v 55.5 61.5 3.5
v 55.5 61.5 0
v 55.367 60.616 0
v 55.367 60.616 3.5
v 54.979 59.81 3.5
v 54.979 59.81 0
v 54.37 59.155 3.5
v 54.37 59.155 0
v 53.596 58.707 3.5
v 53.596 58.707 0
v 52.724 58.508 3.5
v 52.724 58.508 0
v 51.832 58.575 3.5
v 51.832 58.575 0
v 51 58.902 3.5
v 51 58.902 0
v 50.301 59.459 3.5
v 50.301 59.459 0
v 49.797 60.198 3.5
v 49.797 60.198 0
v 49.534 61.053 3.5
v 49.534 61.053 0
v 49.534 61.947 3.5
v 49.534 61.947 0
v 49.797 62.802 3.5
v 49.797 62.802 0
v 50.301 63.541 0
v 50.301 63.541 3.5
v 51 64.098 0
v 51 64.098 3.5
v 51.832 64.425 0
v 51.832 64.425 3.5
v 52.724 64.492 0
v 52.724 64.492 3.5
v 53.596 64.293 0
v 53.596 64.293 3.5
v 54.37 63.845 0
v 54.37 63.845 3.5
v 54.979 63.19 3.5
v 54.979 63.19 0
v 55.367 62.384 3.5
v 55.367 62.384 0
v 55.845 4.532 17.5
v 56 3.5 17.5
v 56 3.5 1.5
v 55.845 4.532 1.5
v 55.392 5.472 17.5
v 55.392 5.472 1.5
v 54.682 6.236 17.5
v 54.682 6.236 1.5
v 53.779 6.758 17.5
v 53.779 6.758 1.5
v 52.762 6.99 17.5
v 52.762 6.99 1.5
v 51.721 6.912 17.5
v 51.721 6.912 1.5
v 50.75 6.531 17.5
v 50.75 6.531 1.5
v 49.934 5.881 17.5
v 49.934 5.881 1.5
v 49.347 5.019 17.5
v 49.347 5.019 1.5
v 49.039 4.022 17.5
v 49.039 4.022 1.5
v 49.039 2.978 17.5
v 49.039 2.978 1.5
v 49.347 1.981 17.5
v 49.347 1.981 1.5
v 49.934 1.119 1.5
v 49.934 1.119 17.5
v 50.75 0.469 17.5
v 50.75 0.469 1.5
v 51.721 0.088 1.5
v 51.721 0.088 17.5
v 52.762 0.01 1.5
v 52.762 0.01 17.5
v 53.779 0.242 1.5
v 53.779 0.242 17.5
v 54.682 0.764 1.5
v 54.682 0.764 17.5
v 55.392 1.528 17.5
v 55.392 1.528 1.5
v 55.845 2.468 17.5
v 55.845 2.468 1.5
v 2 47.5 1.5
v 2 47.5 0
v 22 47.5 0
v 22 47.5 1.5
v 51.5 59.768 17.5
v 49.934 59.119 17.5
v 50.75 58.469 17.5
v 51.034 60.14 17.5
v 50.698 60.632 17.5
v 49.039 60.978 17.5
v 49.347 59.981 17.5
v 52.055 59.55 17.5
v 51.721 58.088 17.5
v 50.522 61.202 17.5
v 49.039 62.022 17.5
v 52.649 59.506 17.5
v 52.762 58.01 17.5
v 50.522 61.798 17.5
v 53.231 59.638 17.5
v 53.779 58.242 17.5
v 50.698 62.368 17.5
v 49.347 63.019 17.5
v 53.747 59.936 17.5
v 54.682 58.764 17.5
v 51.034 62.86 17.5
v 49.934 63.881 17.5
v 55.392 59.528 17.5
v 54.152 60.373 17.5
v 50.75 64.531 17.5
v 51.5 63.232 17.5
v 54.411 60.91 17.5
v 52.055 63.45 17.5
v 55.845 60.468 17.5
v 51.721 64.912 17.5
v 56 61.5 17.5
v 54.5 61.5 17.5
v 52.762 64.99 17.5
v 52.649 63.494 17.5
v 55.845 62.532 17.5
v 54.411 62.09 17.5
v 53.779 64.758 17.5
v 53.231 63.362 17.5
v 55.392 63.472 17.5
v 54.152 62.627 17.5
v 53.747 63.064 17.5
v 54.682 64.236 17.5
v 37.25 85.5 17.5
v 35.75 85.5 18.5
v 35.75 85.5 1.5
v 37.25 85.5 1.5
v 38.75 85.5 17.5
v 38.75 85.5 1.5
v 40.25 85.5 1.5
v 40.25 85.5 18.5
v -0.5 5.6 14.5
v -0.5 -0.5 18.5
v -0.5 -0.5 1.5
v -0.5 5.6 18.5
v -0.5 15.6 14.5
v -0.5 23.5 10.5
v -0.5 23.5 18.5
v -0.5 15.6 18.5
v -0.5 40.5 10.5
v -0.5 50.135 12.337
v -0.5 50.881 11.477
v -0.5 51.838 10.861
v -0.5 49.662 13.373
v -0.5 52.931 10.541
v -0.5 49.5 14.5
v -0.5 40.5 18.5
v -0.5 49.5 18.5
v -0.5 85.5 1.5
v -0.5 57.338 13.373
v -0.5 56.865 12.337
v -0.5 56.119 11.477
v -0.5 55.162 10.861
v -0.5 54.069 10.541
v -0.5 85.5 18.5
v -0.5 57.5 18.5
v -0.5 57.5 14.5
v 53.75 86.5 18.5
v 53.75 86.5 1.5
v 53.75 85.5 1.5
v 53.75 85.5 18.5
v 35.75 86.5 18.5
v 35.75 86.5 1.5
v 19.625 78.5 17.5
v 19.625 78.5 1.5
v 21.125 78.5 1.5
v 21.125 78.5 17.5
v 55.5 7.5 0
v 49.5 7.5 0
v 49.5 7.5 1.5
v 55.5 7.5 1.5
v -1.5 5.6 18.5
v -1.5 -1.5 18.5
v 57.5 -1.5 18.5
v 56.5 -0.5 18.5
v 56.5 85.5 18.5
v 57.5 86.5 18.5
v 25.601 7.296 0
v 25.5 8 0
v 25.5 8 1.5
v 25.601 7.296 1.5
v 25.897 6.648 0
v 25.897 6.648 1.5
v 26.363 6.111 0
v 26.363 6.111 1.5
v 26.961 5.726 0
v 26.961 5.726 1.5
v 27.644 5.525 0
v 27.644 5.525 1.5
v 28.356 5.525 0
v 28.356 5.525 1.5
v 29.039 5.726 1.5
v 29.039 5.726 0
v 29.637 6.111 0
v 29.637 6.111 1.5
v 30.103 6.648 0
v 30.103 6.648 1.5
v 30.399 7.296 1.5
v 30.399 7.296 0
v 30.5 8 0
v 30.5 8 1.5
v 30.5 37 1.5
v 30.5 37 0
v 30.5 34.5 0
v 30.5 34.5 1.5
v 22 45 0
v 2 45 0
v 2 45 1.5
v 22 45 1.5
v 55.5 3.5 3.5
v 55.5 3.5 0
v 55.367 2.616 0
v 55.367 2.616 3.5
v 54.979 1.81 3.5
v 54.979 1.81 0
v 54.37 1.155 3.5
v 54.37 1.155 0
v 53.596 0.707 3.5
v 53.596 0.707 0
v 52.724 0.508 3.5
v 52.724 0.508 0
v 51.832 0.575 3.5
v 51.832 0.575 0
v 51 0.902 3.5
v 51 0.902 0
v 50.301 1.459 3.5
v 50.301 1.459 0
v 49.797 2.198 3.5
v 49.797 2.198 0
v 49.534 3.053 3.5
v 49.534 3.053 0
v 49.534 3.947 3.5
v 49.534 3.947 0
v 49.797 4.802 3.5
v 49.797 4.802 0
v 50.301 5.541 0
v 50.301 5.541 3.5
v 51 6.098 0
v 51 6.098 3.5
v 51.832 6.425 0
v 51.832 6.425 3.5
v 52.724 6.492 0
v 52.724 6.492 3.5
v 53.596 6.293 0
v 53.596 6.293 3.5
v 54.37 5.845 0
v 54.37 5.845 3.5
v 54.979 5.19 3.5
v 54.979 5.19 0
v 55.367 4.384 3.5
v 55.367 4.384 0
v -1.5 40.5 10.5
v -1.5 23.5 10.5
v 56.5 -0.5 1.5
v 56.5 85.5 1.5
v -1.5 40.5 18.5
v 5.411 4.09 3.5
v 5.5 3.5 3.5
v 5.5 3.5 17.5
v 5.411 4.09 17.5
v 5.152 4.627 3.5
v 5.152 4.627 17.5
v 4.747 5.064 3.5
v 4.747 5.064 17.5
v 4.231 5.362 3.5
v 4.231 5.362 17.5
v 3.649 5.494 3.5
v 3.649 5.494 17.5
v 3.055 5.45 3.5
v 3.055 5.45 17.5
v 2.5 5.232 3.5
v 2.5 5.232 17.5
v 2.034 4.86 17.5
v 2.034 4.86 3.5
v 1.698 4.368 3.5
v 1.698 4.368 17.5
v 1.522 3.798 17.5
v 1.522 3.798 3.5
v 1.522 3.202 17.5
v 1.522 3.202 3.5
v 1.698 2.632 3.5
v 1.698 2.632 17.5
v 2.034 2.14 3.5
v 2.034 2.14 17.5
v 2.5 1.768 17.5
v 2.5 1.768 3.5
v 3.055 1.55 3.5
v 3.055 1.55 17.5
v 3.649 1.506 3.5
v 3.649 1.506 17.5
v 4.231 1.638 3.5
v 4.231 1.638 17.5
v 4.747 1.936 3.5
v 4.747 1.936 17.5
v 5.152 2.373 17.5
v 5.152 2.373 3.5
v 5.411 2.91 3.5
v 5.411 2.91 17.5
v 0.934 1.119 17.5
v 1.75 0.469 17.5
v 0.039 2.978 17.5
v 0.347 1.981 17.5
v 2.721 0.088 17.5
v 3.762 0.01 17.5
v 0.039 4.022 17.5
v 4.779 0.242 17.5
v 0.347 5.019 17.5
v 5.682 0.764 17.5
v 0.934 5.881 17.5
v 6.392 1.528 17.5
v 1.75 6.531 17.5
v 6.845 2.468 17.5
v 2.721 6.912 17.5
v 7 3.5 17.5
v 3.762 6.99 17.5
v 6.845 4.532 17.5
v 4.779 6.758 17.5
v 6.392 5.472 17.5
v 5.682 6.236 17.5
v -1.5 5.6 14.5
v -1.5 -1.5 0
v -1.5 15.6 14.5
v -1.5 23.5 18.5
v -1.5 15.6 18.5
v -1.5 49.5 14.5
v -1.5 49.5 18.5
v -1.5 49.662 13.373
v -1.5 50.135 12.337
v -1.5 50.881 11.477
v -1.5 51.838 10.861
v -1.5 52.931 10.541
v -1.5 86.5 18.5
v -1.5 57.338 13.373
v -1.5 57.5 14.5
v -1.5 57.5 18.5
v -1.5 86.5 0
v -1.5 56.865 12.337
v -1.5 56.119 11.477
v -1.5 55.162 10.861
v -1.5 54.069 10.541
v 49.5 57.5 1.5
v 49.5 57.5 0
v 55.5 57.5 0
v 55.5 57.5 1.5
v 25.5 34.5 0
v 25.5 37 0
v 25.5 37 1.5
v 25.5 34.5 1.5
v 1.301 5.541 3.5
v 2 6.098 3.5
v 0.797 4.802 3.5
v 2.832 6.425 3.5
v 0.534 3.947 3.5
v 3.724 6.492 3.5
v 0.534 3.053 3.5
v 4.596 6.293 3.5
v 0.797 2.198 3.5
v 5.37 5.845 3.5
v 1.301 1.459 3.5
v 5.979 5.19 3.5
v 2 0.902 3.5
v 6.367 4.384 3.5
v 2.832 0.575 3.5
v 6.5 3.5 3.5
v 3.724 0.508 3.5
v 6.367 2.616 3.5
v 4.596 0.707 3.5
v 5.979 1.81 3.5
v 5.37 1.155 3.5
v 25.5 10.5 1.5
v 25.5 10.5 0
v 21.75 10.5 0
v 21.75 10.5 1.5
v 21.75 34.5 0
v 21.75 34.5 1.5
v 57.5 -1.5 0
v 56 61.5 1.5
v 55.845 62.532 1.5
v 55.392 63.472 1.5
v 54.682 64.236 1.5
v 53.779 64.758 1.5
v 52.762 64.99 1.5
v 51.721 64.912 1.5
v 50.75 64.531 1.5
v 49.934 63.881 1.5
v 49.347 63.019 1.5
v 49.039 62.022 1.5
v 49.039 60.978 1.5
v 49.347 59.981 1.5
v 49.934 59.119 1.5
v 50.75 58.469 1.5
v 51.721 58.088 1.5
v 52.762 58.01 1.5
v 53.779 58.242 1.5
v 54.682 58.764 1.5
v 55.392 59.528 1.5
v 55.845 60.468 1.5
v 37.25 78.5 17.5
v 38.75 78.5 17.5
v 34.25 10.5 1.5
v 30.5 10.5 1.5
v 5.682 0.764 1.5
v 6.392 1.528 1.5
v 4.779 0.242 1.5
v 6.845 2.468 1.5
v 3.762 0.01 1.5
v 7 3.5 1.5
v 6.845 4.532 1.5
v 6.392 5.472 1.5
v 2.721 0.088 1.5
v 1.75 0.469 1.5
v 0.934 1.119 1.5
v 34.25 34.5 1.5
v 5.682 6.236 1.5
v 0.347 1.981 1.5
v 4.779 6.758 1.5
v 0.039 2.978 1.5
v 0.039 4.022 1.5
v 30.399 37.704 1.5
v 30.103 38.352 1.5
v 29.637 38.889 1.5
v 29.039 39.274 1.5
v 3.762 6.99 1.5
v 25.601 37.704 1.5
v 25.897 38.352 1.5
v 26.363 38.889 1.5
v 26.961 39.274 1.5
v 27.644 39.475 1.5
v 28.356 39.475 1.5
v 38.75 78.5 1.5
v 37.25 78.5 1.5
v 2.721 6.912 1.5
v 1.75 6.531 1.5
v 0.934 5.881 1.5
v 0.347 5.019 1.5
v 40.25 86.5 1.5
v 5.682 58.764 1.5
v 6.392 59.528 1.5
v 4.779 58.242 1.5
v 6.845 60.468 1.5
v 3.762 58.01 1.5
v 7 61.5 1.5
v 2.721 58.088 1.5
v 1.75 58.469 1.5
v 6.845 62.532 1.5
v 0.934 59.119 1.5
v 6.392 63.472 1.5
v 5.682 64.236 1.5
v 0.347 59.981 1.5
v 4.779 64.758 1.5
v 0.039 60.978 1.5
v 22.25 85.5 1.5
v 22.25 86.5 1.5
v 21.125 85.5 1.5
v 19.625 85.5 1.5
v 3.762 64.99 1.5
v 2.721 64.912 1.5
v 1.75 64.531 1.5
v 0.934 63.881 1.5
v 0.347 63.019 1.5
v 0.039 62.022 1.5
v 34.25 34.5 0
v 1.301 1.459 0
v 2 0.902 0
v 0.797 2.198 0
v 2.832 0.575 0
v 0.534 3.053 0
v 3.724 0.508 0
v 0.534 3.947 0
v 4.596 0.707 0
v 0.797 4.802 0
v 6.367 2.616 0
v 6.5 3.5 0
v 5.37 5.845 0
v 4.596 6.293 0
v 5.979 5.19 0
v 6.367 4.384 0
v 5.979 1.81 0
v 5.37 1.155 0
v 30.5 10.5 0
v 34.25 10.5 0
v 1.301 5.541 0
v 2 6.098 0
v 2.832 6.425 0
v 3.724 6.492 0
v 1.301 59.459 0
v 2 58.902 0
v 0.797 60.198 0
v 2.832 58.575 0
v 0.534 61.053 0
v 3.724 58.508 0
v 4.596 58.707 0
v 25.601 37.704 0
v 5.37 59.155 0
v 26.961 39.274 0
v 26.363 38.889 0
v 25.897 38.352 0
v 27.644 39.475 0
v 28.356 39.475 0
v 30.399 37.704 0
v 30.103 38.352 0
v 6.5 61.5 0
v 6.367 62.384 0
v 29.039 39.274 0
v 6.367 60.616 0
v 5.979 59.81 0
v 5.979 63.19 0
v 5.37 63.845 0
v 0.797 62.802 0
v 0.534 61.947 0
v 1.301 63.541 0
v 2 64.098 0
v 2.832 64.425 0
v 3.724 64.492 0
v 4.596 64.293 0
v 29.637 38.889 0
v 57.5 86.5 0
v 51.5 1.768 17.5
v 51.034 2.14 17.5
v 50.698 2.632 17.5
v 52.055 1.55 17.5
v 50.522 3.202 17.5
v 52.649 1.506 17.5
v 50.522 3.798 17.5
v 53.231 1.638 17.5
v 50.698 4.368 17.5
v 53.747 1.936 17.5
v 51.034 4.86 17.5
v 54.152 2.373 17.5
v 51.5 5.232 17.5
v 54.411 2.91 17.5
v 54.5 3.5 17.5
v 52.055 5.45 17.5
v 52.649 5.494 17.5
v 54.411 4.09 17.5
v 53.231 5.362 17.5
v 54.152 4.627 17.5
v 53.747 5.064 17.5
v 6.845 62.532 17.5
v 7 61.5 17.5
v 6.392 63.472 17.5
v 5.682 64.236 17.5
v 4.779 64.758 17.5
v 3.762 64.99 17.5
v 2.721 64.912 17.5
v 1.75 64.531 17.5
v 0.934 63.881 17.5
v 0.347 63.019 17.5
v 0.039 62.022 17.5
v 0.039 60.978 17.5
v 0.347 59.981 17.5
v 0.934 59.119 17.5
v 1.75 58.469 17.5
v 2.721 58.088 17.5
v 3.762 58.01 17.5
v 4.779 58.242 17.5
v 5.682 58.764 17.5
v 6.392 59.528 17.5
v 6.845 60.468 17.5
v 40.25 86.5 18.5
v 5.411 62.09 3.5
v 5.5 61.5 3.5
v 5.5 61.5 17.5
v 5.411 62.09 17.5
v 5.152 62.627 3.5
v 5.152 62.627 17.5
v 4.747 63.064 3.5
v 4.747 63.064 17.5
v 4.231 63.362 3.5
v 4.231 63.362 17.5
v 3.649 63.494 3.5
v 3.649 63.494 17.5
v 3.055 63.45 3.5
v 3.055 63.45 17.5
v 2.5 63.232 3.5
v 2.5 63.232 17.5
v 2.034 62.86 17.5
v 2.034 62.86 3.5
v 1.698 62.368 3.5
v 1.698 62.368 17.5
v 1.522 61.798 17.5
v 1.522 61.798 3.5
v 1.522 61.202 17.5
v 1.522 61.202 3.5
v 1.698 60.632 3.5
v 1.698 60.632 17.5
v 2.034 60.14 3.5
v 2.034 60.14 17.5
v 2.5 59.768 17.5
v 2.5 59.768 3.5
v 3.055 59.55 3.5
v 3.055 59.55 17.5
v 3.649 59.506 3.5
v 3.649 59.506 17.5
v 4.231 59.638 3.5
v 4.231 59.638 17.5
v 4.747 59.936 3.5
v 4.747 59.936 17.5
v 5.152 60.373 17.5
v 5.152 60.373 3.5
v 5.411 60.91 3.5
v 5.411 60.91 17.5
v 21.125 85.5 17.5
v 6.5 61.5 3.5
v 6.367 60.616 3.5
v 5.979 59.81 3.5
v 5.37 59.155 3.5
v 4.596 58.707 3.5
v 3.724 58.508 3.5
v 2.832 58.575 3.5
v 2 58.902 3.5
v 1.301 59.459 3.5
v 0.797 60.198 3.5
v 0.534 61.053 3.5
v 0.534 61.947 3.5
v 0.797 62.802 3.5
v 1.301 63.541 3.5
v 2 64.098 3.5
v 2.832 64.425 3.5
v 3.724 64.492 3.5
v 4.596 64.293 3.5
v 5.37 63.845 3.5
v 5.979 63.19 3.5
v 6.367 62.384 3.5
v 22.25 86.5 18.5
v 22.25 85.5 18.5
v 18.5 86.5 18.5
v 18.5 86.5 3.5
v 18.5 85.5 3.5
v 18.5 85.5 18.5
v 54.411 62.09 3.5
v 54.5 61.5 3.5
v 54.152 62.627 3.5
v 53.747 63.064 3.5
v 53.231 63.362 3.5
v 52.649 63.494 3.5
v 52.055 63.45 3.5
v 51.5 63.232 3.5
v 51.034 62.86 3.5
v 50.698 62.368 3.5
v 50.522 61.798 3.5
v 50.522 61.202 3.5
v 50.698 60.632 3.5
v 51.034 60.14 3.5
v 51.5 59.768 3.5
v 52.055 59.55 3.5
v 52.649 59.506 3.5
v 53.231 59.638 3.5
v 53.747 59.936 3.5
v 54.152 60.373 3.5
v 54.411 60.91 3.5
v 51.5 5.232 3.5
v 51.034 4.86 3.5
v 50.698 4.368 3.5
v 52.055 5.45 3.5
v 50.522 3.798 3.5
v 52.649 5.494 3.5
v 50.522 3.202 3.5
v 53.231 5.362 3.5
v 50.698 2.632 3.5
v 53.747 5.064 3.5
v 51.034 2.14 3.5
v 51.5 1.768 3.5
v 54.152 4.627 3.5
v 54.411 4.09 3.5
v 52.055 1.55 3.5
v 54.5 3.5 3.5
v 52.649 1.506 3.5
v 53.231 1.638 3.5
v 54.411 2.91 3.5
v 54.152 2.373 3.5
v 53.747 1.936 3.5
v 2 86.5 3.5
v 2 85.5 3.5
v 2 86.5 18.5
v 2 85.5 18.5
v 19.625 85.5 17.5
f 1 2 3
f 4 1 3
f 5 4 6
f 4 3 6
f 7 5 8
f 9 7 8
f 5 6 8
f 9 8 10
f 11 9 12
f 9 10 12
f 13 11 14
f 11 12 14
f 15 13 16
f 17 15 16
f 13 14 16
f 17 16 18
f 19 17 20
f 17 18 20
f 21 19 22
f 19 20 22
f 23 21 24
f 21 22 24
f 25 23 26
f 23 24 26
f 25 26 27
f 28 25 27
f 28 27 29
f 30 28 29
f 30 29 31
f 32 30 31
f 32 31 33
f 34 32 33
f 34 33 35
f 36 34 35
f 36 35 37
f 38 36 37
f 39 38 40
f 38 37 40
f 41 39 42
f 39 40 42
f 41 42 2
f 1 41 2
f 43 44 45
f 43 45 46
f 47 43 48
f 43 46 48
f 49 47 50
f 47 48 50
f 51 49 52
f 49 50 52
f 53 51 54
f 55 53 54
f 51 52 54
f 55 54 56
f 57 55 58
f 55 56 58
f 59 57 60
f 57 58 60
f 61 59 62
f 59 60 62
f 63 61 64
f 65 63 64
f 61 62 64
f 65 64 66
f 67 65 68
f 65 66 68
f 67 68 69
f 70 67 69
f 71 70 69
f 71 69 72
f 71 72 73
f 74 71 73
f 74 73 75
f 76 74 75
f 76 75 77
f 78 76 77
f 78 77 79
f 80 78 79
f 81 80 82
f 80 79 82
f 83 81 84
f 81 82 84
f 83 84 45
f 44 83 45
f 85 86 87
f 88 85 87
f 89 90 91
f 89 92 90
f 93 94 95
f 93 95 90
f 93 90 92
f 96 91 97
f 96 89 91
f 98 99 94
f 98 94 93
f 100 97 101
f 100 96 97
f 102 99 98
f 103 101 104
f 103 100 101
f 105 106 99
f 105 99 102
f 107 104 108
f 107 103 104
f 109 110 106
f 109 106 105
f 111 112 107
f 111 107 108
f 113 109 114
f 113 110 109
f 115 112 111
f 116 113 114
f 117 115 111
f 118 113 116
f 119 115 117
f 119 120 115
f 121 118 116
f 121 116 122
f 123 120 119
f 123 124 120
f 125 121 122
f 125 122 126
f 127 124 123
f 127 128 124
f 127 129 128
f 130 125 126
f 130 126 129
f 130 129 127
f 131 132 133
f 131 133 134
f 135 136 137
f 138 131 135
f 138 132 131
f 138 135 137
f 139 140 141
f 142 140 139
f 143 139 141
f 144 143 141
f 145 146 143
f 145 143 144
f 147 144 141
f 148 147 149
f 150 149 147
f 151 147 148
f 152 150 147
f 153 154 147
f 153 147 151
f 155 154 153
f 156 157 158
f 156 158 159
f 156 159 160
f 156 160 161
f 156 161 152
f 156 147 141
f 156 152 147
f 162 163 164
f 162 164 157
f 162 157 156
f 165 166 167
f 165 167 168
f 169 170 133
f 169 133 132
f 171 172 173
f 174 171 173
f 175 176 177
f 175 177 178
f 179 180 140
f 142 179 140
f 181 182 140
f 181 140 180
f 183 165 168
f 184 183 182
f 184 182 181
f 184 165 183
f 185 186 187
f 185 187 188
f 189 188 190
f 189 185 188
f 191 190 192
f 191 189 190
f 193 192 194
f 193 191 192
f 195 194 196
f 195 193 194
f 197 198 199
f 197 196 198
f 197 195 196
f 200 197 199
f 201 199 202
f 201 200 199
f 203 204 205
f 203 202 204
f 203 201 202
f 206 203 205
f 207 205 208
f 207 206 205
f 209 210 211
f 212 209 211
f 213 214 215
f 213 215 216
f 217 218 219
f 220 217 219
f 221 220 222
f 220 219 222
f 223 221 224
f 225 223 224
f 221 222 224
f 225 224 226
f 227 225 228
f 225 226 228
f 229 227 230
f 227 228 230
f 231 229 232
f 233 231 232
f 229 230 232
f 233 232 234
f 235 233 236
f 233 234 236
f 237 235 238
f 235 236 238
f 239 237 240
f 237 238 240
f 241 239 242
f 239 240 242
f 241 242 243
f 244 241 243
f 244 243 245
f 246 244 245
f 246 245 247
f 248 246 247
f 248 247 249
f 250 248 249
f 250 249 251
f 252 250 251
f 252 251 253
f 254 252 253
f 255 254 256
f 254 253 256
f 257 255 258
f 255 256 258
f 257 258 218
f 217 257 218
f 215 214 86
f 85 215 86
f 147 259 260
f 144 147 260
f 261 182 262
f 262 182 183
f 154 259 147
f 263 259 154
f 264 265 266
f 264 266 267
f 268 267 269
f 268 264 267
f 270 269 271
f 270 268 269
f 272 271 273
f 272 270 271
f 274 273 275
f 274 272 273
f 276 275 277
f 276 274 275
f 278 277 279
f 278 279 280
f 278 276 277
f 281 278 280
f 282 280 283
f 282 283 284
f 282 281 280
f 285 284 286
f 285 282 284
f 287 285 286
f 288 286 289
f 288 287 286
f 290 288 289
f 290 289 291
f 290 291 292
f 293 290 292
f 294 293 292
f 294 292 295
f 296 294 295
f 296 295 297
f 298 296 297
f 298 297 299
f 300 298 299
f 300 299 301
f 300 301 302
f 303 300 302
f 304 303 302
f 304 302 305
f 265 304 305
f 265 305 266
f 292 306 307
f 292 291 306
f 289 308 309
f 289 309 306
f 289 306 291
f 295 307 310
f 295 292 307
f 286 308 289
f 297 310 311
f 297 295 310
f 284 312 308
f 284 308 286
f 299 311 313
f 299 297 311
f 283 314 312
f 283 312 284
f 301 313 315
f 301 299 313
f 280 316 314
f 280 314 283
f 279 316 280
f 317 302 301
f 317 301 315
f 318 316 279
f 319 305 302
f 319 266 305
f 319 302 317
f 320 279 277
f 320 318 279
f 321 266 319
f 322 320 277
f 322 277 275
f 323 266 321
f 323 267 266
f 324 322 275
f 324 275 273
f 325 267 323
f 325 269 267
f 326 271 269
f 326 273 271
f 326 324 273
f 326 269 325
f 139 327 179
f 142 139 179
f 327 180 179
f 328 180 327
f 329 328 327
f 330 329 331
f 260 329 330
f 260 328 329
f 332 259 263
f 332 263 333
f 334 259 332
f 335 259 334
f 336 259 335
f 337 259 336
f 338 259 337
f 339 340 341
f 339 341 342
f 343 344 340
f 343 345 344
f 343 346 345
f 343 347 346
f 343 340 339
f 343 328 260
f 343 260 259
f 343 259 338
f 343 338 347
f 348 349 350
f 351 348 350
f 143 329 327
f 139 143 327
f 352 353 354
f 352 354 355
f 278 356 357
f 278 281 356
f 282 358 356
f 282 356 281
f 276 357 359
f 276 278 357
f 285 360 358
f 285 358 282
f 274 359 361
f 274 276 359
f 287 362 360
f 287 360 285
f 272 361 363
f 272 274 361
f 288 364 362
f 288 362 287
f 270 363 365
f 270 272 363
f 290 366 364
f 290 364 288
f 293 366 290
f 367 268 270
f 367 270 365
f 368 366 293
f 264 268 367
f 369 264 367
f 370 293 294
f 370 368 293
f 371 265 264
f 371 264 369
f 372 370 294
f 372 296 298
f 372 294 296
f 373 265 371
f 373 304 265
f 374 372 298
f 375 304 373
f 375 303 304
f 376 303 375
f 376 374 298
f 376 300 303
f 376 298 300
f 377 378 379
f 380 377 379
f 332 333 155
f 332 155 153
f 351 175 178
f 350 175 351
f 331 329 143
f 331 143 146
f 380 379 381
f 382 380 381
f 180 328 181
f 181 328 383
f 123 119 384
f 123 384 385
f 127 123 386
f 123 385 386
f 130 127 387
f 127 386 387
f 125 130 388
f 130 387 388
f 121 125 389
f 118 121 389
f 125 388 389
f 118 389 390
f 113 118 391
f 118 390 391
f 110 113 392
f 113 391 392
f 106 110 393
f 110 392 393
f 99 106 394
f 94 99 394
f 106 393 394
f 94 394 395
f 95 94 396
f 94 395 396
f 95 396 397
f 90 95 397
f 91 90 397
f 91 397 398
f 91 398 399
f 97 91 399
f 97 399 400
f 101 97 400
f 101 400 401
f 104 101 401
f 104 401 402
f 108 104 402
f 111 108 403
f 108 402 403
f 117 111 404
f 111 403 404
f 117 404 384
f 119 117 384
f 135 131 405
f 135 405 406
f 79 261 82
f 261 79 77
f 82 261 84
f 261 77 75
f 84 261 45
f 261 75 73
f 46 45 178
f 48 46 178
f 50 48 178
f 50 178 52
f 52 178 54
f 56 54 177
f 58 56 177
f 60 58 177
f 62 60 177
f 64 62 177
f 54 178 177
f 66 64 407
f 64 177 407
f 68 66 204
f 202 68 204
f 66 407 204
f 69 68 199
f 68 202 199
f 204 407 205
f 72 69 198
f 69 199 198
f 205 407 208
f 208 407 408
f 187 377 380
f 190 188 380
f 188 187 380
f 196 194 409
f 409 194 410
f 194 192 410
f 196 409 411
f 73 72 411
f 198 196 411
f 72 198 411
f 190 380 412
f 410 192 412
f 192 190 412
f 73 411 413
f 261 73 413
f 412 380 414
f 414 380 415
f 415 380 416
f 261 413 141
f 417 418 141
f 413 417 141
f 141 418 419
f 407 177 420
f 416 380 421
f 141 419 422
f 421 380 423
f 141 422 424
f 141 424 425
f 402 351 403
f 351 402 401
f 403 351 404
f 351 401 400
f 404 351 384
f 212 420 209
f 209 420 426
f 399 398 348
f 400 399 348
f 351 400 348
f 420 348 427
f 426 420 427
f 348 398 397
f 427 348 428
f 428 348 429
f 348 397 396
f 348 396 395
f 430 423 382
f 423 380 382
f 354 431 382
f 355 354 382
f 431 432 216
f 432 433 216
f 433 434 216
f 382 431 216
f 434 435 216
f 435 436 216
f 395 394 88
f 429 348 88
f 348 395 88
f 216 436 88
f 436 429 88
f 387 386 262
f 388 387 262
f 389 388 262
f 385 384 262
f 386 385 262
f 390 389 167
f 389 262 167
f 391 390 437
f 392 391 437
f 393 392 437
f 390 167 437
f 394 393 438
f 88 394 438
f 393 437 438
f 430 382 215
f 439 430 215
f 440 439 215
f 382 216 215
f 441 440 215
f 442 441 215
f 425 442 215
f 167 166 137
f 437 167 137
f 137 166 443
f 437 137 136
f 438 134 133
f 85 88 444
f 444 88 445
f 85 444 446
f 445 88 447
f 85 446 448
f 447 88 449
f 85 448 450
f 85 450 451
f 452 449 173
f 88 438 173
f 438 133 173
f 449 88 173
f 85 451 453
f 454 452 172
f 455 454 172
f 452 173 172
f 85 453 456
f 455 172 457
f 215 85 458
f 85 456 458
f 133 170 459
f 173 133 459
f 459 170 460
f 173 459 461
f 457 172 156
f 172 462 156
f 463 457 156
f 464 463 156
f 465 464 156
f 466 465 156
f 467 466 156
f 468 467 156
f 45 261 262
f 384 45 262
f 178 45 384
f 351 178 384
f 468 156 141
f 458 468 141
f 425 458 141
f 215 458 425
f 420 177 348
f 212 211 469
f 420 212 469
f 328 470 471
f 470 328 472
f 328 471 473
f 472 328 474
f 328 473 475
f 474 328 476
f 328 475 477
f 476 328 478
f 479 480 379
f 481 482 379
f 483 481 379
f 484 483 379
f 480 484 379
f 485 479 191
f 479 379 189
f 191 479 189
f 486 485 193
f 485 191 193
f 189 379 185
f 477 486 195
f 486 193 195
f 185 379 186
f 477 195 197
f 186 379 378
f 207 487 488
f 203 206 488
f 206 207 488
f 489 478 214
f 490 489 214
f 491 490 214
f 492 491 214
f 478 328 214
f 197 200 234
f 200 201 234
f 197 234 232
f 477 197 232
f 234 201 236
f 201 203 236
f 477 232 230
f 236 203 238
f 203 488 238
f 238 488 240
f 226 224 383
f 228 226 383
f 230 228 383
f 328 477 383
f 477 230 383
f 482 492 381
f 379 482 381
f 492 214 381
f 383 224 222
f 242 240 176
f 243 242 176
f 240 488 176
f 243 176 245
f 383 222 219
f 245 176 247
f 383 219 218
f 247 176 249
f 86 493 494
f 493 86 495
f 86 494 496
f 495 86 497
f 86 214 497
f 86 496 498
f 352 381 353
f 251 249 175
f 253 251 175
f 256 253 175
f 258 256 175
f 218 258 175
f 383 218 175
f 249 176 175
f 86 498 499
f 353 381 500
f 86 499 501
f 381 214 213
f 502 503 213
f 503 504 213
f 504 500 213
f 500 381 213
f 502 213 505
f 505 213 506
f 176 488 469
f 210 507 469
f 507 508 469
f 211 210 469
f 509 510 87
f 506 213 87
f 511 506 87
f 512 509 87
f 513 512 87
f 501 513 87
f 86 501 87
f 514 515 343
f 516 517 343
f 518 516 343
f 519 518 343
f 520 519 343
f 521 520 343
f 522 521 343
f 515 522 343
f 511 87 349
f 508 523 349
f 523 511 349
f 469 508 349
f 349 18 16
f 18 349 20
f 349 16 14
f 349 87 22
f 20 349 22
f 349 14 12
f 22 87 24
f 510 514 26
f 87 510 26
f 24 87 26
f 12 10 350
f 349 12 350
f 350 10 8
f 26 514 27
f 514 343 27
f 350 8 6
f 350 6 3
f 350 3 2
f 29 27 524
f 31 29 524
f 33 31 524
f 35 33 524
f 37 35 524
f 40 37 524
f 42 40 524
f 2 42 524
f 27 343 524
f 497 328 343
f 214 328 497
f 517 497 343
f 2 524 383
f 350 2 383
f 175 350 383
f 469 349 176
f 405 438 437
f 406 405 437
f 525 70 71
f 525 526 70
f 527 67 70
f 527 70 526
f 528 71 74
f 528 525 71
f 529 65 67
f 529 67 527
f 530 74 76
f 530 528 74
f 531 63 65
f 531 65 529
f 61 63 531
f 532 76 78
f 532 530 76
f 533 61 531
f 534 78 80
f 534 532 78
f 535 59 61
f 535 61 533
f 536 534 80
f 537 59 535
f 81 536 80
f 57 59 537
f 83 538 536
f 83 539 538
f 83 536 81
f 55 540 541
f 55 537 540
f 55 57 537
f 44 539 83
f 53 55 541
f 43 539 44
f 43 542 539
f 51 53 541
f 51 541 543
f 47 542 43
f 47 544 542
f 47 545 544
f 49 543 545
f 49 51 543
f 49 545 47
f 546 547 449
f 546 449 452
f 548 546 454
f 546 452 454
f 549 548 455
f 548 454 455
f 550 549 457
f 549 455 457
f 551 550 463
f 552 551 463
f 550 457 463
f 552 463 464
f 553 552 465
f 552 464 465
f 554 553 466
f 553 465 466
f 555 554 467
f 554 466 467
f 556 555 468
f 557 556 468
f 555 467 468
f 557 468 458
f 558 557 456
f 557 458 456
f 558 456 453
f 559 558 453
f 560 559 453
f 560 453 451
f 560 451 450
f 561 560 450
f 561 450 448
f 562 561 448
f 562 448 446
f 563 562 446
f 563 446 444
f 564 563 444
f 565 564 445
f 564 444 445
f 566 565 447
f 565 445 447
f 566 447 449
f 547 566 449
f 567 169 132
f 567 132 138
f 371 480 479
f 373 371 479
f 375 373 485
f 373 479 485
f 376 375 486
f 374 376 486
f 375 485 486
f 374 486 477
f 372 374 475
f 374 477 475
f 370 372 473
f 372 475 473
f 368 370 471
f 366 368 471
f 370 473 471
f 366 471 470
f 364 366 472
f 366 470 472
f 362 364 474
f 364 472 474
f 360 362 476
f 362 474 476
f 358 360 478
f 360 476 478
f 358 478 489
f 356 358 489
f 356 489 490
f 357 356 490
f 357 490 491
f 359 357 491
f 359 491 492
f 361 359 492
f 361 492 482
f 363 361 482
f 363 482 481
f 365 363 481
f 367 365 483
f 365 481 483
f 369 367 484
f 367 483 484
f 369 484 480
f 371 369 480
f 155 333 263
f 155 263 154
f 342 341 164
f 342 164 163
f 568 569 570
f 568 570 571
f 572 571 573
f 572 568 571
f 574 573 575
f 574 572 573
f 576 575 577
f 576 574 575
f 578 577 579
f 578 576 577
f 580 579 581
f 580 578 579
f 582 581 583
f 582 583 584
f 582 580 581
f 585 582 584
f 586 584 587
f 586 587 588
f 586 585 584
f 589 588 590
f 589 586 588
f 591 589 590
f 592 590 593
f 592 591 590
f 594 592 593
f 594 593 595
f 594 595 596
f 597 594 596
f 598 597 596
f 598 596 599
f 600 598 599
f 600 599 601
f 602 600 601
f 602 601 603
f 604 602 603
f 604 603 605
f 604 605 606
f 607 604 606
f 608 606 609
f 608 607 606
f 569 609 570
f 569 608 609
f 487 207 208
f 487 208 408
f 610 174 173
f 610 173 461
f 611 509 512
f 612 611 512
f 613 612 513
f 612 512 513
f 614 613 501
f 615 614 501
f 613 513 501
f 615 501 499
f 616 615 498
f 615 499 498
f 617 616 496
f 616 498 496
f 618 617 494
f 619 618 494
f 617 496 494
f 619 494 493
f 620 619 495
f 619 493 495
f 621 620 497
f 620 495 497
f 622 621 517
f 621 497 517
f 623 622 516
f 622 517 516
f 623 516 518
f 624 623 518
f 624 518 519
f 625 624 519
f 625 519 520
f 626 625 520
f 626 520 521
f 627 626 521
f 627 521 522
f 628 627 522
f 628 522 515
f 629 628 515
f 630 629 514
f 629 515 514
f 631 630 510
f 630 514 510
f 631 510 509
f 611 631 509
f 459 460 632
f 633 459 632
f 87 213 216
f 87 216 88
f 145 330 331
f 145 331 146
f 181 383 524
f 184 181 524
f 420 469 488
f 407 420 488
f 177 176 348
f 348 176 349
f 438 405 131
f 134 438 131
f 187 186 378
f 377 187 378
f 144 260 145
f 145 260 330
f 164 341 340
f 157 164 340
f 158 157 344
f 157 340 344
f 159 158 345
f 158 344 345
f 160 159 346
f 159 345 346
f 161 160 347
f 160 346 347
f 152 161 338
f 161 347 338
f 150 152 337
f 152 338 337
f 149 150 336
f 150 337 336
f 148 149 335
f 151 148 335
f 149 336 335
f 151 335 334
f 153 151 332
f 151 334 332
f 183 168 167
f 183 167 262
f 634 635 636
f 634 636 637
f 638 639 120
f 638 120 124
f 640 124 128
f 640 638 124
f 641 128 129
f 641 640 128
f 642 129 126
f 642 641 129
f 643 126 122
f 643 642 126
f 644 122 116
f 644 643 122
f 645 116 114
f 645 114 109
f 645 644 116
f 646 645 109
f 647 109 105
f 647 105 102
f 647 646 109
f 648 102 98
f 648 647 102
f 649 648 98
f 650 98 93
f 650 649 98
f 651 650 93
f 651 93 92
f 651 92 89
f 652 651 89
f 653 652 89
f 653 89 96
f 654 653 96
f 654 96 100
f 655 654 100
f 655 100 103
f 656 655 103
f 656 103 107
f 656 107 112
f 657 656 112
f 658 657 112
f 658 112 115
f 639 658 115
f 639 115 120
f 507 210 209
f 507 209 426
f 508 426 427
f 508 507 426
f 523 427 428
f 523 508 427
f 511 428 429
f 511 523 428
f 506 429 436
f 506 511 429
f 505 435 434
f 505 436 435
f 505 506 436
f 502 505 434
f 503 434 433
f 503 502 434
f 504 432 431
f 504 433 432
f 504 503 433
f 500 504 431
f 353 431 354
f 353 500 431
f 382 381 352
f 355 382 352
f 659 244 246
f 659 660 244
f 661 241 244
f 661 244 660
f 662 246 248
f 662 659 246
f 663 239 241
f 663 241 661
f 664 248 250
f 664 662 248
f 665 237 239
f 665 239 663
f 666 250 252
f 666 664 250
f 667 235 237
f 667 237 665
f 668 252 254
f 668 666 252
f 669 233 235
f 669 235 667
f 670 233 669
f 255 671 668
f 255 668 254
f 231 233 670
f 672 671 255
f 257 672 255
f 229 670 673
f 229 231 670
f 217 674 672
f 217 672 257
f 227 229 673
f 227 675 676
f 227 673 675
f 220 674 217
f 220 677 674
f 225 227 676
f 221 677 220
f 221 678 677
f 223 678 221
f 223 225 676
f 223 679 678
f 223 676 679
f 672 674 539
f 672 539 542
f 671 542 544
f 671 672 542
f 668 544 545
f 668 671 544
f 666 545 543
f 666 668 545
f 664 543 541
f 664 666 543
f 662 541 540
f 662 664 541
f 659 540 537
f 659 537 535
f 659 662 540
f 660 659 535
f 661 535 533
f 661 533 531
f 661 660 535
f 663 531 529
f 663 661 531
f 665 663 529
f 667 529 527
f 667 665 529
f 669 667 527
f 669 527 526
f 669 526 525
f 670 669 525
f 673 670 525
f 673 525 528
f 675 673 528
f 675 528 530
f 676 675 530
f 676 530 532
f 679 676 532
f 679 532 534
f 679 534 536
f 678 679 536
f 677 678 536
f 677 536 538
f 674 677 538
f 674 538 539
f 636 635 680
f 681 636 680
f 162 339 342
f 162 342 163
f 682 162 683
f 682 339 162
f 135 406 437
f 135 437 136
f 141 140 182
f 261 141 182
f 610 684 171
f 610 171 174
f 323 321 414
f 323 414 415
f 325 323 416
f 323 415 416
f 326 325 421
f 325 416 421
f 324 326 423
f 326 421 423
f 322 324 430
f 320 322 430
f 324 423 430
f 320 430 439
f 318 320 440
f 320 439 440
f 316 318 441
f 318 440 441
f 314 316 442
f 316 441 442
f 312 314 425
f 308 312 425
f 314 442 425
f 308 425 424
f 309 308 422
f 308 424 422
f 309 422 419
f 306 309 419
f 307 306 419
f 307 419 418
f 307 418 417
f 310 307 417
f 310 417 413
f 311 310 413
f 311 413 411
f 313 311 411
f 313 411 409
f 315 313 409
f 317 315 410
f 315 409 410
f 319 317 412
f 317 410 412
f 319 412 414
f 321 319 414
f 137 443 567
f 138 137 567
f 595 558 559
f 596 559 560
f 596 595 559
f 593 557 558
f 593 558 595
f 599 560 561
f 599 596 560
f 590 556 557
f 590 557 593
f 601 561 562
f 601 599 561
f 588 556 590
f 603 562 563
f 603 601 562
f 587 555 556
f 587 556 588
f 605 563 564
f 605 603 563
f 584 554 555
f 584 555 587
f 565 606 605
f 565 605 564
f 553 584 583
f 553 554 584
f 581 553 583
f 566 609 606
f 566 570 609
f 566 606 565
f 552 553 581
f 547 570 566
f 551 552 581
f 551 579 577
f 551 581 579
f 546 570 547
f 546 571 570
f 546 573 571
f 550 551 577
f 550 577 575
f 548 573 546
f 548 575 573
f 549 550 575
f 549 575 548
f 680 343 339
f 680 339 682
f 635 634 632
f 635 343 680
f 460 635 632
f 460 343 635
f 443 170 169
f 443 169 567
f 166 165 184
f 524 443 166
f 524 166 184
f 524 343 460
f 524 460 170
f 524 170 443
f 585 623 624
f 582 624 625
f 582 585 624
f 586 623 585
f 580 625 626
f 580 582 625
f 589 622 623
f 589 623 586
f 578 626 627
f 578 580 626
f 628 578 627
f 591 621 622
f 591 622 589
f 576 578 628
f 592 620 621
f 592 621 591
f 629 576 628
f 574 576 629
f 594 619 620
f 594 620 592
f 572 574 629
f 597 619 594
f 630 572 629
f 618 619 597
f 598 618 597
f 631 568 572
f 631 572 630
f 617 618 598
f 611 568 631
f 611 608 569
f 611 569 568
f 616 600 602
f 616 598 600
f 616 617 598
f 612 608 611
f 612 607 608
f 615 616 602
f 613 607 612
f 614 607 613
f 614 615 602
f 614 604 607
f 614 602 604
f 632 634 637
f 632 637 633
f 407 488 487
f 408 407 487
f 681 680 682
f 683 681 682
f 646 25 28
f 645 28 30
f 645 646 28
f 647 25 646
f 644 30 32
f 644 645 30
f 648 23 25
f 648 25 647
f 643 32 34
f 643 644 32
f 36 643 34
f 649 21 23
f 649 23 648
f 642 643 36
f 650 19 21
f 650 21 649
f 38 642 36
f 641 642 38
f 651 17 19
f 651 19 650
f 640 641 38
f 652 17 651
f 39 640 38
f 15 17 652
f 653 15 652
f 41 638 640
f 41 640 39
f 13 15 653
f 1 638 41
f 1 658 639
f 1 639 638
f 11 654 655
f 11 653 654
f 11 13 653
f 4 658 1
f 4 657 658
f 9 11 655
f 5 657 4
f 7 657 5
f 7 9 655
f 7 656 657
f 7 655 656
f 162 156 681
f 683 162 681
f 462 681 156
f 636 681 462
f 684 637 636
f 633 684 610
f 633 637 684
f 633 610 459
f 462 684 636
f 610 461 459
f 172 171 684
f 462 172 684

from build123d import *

# Parameters (mm, degrees)
SKETCH_W        = 59
SKETCH_H        = 88
SKETCH_R        = 2
SKETCH_W_2      = 20
SKETCH_H_2      = 2.5
SKETCH_W_3      = 6
SKETCH_H_3      = 50
PAD_DEPTH       = 18.5
SKETCH001_W     = 57
SKETCH001_H     = 86
POCKET_DEPTH    = 17
SKETCH003_W     = 16.5
SKETCH003_H     = 15
SKETCH003_W_2   = 13.5
SKETCH003_H_2   = 17
POCKET001_DEPTH = 1
SKETCH004_R     = 3.5
SKETCH004_R_2   = 2
SKETCH004_W     = 1.5
SKETCH004_H     = 7
PAD001_DEPTH    = 16
SKETCH005_W     = 10
SKETCH005_H     = 4
SKETCH005_W_2   = 17
SKETCH005_H_2   = 8
POCKET002_DEPTH = 1
SKETCH006_R     = 3
POCKET003_DEPTH = 3.5


with BuildPart() as part:
    # Sketch → Pad (new body)
    with BuildSketch(Plane.XY):
        with Locations((28, 42.5)):
            Rectangle(SKETCH_W, SKETCH_H)
        with Locations((3.5, 61.5)):
            Circle(SKETCH_R, mode=Mode.SUBTRACT)
        with Locations((52.5, 61.5)):
            Circle(SKETCH_R, mode=Mode.SUBTRACT)
        with Locations((52.5, 3.5)):
            Circle(SKETCH_R, mode=Mode.SUBTRACT)
        with Locations((3.5, 3.5)):
            Circle(SKETCH_R, mode=Mode.SUBTRACT)
        with Locations((12, 46.25)):
            Rectangle(SKETCH_W_2, SKETCH_H_2, mode=Mode.SUBTRACT)
        with BuildLine():
            Line((21.75, 34.5), (25.5, 34.5))
            Line((25.5, 37), (25.5, 34.5))
            ThreePointArc((30.5, 37), (28, 39.5), (25.5, 37))
            Line((30.5, 37), (30.5, 34.5))
            Line((30.5, 34.5), (34.25, 34.5))
            Line((34.25, 34.5), (34.25, 10.5))
            Line((34.25, 10.5), (30.5, 10.5))
            Line((30.5, 8), (30.5, 10.5))
            ThreePointArc((25.5, 8), (28, 5.5), (30.5, 8))
            Line((25.5, 8), (25.5, 10.5))
            Line((25.5, 10.5), (21.75, 10.5))
            Line((21.75, 10.5), (21.75, 34.5))
        make_face(mode=Mode.SUBTRACT)
        with Locations((52.5, 32.5)):
            Rectangle(SKETCH_W_3, SKETCH_H_3, mode=Mode.SUBTRACT)
    extrude(amount=PAD_DEPTH)

    # Sketch001 → Pocket (cut)
    with BuildSketch(Plane.XY.offset(18.5)):
        with Locations((28, 42.5)):
            Rectangle(SKETCH001_W, SKETCH001_H)
    extrude(amount=-POCKET_DEPTH, mode=Mode.SUBTRACT)

    # Sketch003 → Pocket001 (cut)
    with BuildSketch(Plane(origin=(0, 86.5, 0), x_dir=(-1, 0, 0), z_dir=(0, 1, 0))):
        with Locations((-10.25, 11)):
            Rectangle(SKETCH003_W, SKETCH003_H)
        with Locations((-29, 10)):
            Rectangle(SKETCH003_W_2, SKETCH003_H_2)
        with Locations((-47, 10)):
            Rectangle(SKETCH003_W_2, SKETCH003_H_2)
    extrude(amount=-POCKET001_DEPTH, mode=Mode.SUBTRACT)

    # Sketch004 → Pad001 (new body)
    with BuildSketch(Plane.XY.offset(1.5)):
        with Locations((3.5, 61.5)):
            Circle(SKETCH004_R)
        with Locations((3.5, 61.5)):
            Circle(SKETCH004_R_2, mode=Mode.SUBTRACT)
        with Locations((52.5, 61.5)):
            Circle(SKETCH004_R)
        with Locations((52.5, 61.5)):
            Circle(SKETCH004_R_2, mode=Mode.SUBTRACT)
        with Locations((52.5, 3.5)):
            Circle(SKETCH004_R)
        with Locations((52.5, 3.5)):
            Circle(SKETCH004_R_2, mode=Mode.SUBTRACT)
        with Locations((3.5, 3.5)):
            Circle(SKETCH004_R)
        with Locations((3.5, 3.5)):
            Circle(SKETCH004_R_2, mode=Mode.SUBTRACT)
        with Locations((20.375, 82)):
            Rectangle(SKETCH004_W, SKETCH004_H)
        with Locations((38, 82)):
            Rectangle(SKETCH004_W, SKETCH004_H)
    extrude(amount=PAD001_DEPTH)

    # Sketch005 → Pocket002 (cut)
    with BuildSketch(Plane(origin=(-1.5, 0, 0), x_dir=(0, -1, 0), z_dir=(-1, 0, 0))):
        with Locations((-10.6, 16.5)):
            Rectangle(SKETCH005_W, SKETCH005_H)
        with Locations((-32, 14.5)):
            Rectangle(SKETCH005_W_2, SKETCH005_H_2)
        with BuildLine():
            Line((-57.5, 18.5), (-49.5, 18.5))
            Line((-49.5, 18.5), (-49.5, 14.5))
            ThreePointArc((-57.5, 14.5), (-53.5, 10.5), (-49.5, 14.5))
            Line((-57.5, 14.5), (-57.5, 18.5))
        make_face()
    extrude(amount=-POCKET002_DEPTH, mode=Mode.SUBTRACT)

    # Sketch006 → Pocket003 (cut)
    with BuildSketch(Plane(origin=(0, 0, 0), x_dir=(1, 0, 0), z_dir=(0, 0, -1))):
        with Locations((3.5, -3.5)):
            Circle(SKETCH006_R)
        with Locations((52.5, -3.5)):
            Circle(SKETCH006_R)
        with Locations((52.5, -61.5)):
            Circle(SKETCH006_R)
        with Locations((3.5, -61.5)):
            Circle(SKETCH006_R)
    extrude(amount=-POCKET003_DEPTH, mode=Mode.SUBTRACT)


solid = part.part
